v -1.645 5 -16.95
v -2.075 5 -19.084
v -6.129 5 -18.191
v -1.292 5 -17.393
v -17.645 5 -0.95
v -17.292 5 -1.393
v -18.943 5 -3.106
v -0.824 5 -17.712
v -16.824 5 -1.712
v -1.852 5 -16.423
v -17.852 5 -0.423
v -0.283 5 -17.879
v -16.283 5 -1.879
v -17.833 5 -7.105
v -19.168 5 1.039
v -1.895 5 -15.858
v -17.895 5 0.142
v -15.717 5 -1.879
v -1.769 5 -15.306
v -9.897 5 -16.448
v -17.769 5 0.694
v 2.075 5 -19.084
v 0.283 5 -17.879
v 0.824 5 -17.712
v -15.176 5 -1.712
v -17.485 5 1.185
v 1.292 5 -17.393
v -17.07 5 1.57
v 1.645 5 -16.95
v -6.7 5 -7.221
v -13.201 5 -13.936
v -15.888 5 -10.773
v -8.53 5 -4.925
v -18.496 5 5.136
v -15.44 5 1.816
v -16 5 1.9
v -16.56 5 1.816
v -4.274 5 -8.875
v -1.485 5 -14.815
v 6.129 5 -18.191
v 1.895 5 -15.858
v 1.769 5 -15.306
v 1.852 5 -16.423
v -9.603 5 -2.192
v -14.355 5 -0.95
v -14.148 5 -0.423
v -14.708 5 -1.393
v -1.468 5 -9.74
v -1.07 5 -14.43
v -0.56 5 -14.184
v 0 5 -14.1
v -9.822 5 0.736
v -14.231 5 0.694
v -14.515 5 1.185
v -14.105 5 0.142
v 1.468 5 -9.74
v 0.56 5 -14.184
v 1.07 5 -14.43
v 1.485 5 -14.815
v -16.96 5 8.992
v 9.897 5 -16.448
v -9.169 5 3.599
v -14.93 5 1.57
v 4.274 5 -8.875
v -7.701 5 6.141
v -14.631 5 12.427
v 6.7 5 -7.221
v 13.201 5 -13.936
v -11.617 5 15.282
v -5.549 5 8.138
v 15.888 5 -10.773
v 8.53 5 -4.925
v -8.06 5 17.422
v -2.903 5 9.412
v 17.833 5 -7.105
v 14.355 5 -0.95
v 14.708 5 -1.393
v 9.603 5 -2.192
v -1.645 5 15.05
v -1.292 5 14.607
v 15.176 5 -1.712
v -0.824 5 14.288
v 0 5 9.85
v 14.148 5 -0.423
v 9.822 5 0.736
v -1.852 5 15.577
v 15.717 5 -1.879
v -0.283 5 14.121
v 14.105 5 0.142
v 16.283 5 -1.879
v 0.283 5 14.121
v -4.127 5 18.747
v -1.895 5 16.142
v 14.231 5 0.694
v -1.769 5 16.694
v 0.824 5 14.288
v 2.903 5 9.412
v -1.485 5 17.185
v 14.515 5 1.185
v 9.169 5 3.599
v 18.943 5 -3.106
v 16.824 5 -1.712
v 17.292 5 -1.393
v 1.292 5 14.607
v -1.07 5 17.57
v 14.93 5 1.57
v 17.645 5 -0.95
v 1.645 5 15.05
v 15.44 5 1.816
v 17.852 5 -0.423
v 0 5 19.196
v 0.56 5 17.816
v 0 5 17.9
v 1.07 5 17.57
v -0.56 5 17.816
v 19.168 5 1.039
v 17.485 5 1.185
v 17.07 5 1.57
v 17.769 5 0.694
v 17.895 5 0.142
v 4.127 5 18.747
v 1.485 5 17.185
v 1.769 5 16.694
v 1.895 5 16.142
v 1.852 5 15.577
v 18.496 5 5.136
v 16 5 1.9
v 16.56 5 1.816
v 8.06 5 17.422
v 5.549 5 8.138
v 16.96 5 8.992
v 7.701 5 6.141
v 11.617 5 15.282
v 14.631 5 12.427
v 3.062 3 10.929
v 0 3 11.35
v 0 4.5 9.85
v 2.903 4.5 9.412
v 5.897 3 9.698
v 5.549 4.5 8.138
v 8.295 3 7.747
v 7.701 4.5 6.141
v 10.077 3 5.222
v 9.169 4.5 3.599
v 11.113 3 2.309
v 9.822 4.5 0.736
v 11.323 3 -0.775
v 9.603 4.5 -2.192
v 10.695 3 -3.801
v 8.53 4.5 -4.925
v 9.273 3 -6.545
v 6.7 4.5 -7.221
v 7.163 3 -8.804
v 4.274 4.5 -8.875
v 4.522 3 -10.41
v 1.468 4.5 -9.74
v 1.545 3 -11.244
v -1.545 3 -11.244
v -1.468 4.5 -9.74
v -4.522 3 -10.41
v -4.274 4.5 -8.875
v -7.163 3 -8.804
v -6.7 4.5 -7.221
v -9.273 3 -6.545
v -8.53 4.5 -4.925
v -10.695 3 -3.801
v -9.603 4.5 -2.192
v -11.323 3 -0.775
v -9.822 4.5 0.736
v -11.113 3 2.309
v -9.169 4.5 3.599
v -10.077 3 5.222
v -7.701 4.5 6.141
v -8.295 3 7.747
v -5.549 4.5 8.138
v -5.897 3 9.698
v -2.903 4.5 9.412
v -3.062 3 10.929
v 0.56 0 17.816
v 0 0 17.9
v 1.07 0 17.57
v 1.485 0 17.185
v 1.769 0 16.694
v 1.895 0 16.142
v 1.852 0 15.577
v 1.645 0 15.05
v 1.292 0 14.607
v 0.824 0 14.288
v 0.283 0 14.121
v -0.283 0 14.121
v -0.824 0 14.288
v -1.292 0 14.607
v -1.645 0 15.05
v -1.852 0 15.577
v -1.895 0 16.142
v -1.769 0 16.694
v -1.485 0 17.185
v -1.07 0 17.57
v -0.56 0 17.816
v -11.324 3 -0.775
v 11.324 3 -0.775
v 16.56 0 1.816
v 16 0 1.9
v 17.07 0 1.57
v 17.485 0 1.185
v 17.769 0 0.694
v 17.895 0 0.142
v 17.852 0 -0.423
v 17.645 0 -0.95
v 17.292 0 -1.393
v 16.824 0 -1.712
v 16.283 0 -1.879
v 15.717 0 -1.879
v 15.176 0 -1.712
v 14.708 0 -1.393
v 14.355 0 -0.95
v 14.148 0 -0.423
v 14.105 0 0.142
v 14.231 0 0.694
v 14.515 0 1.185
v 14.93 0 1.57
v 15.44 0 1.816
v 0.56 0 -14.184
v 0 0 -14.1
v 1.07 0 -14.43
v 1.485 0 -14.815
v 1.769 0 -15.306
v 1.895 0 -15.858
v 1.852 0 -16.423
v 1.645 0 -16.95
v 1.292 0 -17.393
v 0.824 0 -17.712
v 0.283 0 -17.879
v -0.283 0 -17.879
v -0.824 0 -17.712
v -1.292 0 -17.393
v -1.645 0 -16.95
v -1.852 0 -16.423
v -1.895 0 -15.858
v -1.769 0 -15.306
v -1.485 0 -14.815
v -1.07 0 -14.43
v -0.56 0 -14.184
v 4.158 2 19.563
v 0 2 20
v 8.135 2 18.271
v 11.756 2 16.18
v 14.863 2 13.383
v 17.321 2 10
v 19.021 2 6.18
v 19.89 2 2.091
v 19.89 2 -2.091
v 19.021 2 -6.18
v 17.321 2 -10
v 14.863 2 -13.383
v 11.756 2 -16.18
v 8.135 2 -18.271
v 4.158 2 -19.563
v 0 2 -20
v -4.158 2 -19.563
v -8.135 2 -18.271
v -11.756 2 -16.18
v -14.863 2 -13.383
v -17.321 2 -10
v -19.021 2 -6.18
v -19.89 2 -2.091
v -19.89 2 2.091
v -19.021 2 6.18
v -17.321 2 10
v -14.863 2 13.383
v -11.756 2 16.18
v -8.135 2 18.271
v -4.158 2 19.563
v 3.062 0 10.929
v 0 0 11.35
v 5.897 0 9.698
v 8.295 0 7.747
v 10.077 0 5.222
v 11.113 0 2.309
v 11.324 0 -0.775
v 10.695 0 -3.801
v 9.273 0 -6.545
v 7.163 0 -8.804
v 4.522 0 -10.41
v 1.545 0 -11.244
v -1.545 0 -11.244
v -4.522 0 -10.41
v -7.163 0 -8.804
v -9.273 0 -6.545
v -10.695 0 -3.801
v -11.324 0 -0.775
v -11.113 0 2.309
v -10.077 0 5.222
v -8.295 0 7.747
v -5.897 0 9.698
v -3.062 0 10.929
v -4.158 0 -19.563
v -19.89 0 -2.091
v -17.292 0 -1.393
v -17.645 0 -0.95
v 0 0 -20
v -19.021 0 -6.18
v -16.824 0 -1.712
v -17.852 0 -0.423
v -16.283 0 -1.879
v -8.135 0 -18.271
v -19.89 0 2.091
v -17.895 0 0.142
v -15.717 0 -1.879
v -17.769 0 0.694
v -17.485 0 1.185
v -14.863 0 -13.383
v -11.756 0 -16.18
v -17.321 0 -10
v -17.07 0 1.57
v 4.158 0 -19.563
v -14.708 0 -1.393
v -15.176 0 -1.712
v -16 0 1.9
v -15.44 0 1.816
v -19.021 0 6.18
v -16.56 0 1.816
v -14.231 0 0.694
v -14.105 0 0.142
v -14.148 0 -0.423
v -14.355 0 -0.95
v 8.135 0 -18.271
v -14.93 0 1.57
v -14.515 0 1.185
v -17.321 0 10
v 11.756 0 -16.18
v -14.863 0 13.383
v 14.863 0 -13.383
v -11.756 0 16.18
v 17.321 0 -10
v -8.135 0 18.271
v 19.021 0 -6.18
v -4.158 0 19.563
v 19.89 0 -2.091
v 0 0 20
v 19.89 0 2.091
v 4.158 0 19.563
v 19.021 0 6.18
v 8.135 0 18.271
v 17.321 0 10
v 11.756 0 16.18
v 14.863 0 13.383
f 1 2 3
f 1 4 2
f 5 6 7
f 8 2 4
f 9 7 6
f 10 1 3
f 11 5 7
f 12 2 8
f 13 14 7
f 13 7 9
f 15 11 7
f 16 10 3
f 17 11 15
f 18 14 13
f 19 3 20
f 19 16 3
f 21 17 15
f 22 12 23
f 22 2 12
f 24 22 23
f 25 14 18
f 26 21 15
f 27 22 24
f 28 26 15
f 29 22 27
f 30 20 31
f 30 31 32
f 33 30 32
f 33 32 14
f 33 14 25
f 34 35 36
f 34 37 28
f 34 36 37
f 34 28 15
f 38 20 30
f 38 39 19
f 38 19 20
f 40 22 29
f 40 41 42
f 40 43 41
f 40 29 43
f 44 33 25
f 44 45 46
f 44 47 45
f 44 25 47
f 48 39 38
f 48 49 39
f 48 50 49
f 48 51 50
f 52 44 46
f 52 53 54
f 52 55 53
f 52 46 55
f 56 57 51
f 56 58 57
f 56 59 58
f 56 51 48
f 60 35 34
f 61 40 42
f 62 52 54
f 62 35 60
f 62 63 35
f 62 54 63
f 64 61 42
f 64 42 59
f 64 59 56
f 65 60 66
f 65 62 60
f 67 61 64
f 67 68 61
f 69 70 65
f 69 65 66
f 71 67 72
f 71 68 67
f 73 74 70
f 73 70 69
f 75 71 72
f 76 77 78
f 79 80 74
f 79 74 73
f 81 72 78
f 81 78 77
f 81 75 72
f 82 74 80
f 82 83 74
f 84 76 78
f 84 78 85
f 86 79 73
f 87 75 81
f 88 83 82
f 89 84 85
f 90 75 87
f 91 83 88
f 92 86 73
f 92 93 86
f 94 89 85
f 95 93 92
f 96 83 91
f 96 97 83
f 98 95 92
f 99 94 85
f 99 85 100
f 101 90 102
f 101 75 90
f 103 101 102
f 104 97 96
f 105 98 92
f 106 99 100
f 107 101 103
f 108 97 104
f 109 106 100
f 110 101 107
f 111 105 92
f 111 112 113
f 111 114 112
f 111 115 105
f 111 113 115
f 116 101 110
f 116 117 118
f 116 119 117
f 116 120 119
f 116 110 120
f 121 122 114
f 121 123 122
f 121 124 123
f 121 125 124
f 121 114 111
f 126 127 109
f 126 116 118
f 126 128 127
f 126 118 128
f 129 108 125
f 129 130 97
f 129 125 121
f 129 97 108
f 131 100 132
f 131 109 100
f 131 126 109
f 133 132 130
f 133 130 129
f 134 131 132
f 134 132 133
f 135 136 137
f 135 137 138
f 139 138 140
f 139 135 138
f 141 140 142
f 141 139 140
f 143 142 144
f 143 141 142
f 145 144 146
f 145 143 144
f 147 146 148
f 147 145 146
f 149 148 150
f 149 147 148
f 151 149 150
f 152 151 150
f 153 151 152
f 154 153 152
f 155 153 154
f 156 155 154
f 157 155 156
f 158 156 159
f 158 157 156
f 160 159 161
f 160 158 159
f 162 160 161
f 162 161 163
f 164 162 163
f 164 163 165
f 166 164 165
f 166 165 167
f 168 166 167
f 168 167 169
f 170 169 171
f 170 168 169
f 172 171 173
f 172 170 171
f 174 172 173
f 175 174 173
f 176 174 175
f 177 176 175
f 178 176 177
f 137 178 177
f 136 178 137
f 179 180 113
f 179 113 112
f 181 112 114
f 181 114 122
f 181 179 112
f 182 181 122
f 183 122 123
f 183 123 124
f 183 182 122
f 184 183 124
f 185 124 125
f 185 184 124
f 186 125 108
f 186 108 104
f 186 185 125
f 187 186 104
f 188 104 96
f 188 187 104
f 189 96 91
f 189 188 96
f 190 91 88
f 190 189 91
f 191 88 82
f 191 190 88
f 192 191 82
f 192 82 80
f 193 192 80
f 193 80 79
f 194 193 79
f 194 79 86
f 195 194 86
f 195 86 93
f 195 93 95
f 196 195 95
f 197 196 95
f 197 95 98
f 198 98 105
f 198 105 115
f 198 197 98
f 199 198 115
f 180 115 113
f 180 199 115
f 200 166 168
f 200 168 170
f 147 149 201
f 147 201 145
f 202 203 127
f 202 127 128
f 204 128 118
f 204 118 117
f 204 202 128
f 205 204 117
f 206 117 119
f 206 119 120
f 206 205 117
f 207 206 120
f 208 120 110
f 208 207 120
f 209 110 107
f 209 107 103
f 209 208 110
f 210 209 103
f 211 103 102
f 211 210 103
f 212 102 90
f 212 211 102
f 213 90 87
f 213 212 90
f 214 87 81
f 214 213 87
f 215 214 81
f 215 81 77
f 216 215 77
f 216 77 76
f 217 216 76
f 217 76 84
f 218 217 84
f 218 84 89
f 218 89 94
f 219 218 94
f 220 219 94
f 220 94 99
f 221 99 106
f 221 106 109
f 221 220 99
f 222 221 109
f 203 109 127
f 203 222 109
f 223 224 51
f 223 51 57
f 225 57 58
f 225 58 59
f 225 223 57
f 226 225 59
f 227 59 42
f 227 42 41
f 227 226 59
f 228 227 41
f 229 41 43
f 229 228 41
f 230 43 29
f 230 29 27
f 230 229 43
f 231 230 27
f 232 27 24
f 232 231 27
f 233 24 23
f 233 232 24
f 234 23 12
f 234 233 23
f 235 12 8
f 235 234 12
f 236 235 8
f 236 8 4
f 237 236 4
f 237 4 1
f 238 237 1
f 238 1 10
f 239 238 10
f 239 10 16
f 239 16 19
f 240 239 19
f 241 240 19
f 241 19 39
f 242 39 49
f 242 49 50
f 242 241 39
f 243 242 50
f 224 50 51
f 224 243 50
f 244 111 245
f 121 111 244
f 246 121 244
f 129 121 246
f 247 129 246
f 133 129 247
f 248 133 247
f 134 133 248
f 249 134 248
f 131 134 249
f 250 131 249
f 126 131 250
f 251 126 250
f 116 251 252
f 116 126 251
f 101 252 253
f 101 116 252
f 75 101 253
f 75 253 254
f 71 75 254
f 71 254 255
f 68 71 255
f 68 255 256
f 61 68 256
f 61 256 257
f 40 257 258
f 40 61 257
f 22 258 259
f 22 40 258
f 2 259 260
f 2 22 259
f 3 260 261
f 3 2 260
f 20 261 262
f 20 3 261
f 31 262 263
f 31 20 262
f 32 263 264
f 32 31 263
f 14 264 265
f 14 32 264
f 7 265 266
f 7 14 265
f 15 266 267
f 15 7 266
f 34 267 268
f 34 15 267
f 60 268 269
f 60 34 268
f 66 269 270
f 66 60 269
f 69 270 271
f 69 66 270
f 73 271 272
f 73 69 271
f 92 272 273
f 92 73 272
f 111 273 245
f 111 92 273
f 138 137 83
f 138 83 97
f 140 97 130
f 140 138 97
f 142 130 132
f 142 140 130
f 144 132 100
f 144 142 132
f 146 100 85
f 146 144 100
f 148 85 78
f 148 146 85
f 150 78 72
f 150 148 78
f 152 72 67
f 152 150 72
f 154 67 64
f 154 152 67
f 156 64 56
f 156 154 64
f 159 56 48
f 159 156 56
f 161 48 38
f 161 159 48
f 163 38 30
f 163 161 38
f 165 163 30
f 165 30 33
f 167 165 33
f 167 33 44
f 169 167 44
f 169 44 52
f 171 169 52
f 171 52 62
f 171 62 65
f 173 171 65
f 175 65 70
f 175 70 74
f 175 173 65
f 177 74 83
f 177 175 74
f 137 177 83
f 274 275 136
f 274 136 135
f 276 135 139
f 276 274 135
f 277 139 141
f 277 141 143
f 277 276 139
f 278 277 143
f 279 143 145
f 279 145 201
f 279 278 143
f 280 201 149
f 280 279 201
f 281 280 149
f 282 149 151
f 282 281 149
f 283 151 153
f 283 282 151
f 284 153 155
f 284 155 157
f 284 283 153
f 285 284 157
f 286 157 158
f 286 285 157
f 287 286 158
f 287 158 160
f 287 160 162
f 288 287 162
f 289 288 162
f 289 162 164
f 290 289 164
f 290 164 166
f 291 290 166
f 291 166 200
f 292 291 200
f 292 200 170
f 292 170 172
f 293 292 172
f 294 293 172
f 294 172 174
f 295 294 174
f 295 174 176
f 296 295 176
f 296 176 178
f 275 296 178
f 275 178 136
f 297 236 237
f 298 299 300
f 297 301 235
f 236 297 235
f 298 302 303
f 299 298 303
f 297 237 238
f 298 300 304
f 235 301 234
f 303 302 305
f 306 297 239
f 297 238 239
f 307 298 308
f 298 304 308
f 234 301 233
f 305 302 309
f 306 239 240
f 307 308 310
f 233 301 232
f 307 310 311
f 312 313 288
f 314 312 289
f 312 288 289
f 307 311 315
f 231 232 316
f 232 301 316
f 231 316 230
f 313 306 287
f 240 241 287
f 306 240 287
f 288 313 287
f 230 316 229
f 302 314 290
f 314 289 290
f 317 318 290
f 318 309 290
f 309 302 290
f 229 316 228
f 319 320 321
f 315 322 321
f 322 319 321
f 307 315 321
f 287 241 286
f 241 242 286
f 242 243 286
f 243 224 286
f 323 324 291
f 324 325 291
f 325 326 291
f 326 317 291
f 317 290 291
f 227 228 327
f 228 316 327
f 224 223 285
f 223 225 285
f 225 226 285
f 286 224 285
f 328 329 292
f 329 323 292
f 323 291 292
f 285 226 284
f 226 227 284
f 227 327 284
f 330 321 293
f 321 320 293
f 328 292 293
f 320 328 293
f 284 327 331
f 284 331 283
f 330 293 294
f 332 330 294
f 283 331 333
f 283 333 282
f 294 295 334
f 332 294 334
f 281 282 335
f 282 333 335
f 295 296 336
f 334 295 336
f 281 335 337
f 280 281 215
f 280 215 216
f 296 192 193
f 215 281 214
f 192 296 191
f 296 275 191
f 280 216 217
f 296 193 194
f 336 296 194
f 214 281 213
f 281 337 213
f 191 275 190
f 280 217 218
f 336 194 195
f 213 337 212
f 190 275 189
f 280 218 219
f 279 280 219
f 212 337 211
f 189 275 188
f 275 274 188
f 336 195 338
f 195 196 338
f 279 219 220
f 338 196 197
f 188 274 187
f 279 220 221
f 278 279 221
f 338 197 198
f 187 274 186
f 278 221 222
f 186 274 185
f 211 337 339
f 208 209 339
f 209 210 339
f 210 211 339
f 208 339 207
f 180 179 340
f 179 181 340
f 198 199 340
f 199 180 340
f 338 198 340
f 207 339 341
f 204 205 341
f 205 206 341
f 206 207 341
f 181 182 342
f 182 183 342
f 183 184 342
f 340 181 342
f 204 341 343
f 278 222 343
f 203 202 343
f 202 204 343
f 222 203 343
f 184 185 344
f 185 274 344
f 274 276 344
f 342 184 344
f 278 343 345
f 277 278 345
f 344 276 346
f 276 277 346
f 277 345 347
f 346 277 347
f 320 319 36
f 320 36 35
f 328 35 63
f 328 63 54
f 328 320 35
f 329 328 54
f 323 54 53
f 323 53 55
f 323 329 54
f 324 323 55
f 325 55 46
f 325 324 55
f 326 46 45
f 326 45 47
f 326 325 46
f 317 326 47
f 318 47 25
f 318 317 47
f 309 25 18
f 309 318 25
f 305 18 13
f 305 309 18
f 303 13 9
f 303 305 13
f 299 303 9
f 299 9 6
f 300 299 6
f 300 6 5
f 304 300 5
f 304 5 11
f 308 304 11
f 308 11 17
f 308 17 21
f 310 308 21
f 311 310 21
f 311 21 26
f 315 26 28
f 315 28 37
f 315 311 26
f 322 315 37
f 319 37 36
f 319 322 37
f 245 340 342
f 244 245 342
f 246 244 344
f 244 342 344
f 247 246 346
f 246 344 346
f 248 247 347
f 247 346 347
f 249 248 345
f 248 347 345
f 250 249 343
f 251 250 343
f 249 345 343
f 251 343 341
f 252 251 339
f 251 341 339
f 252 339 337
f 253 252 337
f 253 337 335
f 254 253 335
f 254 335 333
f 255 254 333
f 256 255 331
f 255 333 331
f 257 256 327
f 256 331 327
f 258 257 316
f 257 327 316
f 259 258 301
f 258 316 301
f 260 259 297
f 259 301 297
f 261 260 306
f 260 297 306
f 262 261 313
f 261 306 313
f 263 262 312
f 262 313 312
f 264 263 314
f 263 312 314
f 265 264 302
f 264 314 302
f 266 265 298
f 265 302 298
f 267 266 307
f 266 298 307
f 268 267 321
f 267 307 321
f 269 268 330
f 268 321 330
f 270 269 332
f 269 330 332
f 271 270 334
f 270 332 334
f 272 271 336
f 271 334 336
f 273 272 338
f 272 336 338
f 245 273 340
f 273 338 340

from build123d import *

# Parameters (mm, degrees)
SKETCH1_R           = 20
SKETCH1_R_2         = 11.35
SKETCH1_R_3         = 1.9
BOSS_EXTRUDE1_DEPTH = 5
CHAMFER1_SIZE       = 3
CHAMFER1_SIZE2      = 0.803847577
BOSS_EXTRUDE2_START = -2
SKETCH2_R           = 11.35
SKETCH2_R_2         = 9.85
BOSS_EXTRUDE2_DEPTH = 2
CHAMFER2_SIZE       = 1.5


with BuildPart() as part:
    # Sketch1 → Boss-Extrude1 (new body)
    with BuildSketch(Plane(origin=(0, 0, 0), x_dir=(1, 0, 0), z_dir=(0, 1, 0))):
        with Locations(Location((0, 0, 0), (0, 0, 270))):
            Circle(SKETCH1_R)
        with Locations(Location((0, 0, 0), (0, 0, 270))):
            Circle(SKETCH1_R_2, mode=Mode.SUBTRACT)
        with Locations(Location((0, 16, 0), (0, 0, 270))):
            Circle(SKETCH1_R_3, mode=Mode.SUBTRACT)
        with Locations(Location((16, 0, 0), (0, 0, 270))):
            Circle(SKETCH1_R_3, mode=Mode.SUBTRACT)
        with Locations(Location((0, -16, 0), (0, 0, 270))):
            Circle(SKETCH1_R_3, mode=Mode.SUBTRACT)
        with Locations(Location((-16, 0, 0), (0, 0, 270))):
            Circle(SKETCH1_R_3, mode=Mode.SUBTRACT)
    extrude(amount=BOSS_EXTRUDE1_DEPTH)

    # Chamfer1
    chamfer1_edges = [part.edges().sort_by_distance(p)[0] for p in [
        (0, 5, -20),
    ]]
    chamfer1_side = [part.faces().sort_by_distance(p)[0] for p in [
        (0, 2.5, -20),
    ]]
    chamfer(chamfer1_edges, length=CHAMFER1_SIZE, length2=CHAMFER1_SIZE2, reference=chamfer1_side[0])

    # Sketch2 → Boss-Extrude2 (add)
    with BuildSketch(Plane(origin=(0, 5, 0), x_dir=(1, 0, 0), z_dir=(0, 1, 0)).offset(BOSS_EXTRUDE2_START)):
        with Locations(Location((0, 0, 0), (0, 0, 270))):
            Circle(SKETCH2_R)
        with Locations(Location((0, 0, 0), (0, 0, 270))):
            Circle(SKETCH2_R_2, mode=Mode.SUBTRACT)
    extrude(amount=BOSS_EXTRUDE2_DEPTH)

    # Chamfer2
    chamfer2_edges = [part.edges().sort_by_distance(p)[0] for p in [
        (0, 3, -9.85),
    ]]
    chamfer(chamfer2_edges, length=CHAMFER2_SIZE - 0.0001)  # a hair under: the kernel refuses the full size


solid = part.part
